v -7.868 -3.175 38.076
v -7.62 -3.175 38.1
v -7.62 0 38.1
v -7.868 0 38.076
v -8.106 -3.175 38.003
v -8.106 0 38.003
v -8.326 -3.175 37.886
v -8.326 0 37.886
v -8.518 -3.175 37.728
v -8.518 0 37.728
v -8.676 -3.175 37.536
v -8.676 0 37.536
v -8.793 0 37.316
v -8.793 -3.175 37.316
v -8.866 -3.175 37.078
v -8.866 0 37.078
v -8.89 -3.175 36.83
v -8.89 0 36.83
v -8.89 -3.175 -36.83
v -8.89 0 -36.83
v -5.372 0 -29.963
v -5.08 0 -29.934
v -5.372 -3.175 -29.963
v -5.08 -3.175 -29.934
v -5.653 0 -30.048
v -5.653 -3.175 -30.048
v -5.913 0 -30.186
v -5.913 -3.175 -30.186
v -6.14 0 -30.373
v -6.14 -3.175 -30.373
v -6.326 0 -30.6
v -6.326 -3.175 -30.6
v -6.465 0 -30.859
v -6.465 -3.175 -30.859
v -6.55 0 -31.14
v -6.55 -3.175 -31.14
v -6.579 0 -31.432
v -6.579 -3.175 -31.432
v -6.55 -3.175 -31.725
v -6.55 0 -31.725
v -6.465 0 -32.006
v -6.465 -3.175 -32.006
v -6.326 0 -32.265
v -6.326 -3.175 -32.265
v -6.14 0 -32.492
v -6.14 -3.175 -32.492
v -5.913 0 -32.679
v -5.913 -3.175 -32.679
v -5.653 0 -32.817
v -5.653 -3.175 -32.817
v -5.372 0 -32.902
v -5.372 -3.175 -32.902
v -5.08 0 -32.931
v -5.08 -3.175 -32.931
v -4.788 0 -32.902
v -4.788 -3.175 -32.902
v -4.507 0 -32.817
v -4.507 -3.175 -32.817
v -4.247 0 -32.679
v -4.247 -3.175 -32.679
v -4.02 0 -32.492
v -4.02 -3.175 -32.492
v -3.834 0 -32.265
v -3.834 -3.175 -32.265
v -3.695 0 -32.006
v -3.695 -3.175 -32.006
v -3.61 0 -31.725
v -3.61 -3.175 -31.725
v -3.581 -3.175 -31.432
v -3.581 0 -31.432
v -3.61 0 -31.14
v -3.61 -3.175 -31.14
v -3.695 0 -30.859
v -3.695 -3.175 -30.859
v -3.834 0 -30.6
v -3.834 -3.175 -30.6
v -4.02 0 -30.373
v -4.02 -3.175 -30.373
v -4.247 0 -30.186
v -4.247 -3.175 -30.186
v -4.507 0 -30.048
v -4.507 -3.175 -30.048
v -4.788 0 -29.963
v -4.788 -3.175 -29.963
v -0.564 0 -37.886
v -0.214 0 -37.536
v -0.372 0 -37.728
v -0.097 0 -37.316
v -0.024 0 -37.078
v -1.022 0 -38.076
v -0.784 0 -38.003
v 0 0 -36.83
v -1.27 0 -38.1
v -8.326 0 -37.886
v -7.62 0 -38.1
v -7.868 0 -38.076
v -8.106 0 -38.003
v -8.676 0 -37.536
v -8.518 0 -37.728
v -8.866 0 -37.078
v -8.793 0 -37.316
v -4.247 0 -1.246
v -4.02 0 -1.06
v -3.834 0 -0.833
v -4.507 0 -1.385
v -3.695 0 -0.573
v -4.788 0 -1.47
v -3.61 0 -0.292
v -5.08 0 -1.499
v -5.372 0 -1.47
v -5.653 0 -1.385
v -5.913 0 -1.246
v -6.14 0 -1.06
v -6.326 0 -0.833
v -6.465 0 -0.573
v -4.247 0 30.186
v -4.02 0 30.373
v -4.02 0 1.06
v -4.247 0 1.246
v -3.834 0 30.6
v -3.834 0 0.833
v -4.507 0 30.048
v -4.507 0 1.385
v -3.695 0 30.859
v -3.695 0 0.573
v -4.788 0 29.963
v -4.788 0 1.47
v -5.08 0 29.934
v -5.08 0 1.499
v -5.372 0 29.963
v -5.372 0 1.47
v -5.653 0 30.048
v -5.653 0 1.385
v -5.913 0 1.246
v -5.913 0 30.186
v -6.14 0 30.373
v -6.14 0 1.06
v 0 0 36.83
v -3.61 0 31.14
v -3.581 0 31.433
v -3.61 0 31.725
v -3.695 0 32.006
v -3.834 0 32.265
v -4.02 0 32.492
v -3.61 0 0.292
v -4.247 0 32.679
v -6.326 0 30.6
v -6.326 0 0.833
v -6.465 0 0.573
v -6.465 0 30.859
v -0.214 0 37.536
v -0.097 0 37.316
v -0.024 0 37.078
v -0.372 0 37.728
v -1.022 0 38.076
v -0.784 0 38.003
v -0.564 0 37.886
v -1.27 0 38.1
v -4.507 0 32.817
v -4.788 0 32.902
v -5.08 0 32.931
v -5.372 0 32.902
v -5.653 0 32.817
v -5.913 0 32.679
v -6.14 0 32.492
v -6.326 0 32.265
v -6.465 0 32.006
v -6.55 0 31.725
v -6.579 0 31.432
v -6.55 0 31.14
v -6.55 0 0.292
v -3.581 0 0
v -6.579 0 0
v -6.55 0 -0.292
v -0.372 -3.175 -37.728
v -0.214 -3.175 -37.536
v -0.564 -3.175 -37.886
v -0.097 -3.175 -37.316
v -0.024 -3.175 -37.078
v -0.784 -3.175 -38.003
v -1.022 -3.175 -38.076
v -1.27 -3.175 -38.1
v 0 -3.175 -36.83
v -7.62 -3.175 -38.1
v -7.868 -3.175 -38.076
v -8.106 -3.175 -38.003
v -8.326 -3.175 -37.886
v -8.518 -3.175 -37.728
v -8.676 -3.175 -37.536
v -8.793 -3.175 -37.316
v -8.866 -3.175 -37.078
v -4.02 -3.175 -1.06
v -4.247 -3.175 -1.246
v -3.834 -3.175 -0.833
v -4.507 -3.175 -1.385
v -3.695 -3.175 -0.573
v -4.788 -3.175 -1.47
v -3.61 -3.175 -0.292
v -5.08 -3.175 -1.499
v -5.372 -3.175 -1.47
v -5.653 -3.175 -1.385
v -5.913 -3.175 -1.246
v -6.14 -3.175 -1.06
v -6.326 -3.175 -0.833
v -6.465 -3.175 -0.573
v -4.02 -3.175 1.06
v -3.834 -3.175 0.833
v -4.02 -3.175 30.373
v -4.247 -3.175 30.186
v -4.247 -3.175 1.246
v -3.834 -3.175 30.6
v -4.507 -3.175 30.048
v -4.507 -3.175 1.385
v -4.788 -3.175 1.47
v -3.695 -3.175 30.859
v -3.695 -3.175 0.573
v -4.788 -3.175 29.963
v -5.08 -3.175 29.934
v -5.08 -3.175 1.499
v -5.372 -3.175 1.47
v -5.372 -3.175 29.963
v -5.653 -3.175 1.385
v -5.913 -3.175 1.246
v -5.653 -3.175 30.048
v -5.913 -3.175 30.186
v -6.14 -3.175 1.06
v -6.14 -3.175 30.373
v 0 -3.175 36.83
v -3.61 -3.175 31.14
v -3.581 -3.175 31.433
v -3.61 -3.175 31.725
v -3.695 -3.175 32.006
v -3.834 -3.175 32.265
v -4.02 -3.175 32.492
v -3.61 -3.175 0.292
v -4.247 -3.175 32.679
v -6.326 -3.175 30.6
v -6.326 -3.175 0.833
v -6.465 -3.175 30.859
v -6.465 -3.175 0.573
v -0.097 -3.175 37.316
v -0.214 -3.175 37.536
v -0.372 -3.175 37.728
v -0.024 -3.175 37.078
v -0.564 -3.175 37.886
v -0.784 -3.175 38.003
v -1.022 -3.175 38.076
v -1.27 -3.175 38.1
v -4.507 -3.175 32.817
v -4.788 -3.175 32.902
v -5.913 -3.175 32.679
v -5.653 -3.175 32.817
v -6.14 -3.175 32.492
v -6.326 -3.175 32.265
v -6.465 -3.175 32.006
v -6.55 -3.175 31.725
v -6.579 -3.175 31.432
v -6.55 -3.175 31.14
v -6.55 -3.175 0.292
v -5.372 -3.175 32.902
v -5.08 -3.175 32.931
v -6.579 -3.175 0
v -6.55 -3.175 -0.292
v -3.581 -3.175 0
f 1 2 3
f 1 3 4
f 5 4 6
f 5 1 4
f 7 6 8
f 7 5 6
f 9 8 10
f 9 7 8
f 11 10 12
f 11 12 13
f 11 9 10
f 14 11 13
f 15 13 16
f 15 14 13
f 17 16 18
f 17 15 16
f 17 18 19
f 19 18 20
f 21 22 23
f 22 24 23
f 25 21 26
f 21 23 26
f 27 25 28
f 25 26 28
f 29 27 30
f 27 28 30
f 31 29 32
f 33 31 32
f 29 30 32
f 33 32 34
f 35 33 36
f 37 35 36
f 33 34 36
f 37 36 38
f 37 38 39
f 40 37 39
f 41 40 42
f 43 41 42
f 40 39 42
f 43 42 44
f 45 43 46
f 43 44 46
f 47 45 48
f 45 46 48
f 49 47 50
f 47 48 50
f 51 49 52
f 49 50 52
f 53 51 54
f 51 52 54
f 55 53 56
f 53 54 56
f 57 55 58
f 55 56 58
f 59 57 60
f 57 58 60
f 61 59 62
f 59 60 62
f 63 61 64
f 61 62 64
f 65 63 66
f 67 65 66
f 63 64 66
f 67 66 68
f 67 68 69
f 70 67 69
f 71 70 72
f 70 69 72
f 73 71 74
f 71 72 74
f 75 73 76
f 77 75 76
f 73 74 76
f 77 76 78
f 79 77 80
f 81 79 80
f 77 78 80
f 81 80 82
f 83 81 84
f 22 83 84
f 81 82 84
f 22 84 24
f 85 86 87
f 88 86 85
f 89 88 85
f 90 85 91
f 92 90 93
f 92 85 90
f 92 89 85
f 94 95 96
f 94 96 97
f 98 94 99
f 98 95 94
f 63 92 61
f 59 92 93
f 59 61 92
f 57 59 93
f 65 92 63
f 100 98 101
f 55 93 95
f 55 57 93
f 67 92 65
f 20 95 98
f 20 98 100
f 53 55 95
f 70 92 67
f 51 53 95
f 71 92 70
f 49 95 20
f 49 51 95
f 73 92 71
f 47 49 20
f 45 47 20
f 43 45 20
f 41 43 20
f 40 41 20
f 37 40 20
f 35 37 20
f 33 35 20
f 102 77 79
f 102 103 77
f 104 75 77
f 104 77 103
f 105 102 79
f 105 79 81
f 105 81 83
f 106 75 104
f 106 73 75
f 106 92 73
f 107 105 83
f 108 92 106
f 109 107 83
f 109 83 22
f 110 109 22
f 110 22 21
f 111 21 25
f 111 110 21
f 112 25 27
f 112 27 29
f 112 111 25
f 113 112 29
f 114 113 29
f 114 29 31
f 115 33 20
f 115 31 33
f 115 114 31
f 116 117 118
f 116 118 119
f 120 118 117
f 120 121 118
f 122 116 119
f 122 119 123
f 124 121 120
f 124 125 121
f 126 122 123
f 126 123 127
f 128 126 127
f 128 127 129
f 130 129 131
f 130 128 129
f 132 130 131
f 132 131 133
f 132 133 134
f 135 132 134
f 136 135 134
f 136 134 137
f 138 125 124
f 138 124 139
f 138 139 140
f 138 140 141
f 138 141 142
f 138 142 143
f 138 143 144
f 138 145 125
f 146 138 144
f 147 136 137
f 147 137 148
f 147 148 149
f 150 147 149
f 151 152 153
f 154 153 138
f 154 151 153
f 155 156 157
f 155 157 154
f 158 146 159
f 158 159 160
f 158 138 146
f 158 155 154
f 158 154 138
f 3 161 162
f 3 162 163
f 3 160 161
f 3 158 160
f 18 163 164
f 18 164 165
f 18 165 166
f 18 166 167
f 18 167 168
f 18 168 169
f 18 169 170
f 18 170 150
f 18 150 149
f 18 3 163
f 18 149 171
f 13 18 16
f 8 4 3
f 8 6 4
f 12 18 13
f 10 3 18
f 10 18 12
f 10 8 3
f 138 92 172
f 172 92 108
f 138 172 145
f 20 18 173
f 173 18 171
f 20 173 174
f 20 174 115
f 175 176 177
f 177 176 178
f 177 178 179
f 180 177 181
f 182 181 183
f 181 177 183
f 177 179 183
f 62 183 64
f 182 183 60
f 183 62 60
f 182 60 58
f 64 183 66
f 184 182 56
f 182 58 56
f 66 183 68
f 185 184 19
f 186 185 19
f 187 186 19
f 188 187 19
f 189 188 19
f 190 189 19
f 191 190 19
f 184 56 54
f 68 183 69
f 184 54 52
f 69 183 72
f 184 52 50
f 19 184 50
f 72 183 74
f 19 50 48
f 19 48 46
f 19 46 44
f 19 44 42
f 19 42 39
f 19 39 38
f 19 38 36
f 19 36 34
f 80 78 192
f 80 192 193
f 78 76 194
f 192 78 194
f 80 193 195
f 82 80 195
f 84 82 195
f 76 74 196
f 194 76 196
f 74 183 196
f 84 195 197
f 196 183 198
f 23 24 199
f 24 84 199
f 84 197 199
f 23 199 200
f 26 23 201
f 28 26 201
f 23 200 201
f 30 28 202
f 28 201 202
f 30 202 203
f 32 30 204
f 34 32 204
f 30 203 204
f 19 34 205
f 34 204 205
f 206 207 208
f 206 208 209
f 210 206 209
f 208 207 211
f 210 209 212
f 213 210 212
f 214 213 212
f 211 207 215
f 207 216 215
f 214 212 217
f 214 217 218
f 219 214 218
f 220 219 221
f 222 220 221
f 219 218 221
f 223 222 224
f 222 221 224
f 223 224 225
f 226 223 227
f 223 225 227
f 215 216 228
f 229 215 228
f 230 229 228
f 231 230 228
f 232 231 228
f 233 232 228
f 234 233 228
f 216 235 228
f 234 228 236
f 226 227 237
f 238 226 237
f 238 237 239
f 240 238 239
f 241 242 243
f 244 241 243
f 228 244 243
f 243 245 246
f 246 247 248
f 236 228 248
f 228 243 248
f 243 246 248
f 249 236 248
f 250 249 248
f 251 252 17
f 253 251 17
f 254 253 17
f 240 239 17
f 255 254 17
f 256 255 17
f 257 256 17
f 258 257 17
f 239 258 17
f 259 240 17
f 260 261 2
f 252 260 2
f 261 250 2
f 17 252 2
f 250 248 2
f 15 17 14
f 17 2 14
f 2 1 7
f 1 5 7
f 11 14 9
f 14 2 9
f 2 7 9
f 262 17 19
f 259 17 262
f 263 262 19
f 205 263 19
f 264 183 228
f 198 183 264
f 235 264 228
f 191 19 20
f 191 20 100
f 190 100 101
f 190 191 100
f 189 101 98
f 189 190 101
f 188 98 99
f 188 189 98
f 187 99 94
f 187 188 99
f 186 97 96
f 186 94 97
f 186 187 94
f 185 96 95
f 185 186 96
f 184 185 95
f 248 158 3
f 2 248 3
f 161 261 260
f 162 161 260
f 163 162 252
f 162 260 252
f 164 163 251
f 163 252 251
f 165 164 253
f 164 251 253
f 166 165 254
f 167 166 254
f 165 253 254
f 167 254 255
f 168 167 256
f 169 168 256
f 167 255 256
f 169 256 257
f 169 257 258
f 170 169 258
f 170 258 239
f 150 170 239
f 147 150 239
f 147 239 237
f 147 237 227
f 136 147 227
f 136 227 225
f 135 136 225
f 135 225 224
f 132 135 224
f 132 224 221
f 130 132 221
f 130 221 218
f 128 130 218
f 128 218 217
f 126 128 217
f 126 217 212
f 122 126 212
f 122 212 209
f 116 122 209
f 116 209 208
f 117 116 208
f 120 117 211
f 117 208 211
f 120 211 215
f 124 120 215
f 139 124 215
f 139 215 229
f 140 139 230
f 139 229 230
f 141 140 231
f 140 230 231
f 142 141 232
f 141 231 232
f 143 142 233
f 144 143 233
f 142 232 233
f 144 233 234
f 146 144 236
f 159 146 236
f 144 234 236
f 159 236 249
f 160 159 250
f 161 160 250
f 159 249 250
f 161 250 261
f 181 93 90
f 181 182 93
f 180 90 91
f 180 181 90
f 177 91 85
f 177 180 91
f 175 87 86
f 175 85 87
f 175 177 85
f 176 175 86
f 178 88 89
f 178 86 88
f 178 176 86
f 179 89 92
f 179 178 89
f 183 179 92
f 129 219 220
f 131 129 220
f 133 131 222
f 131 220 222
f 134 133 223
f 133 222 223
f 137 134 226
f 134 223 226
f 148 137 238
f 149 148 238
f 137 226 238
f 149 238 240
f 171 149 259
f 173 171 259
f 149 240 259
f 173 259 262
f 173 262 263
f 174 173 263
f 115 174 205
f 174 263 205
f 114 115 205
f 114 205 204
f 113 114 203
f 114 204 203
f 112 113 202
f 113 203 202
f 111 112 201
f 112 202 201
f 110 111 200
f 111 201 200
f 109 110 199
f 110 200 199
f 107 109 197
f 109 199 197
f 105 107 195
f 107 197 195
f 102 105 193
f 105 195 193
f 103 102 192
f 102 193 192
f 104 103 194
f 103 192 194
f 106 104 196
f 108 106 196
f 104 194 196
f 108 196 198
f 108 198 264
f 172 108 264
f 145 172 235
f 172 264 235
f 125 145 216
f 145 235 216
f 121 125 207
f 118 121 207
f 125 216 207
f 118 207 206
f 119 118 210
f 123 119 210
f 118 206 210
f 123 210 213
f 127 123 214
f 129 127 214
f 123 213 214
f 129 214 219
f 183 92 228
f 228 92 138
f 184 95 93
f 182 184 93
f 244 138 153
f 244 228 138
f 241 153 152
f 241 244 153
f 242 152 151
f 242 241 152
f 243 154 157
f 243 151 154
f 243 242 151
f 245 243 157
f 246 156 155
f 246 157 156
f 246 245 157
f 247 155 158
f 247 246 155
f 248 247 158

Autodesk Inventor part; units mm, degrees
ref_plane "YZ Plane" through (0, 0, 0) normal (1, 0, 0) x (0, 1, 0)
ref_plane "XZ Plane" through (0, 0, 0) normal (0, 1, 0) x (-1, 0, 0)
ref_plane "XY Plane" through (0, 0, 0) normal (0, 0, 1) x (1, 0, 0)
sketch "Sketch1" plane through (0, 0, 0) normal (0, 1, 0) x (-1, 0, 0)
  line L0 (-1.778, 0) -> (10.668, 0) projected
  line L1 (0, -53.34) -> (0, 53.34) projected
  line L2 (8.89, -38.1) -> (0, -38.1)
  line L3 (0, -38.1) -> (0, 38.1)
  line L4 (0, 38.1) -> (8.89, 38.1)
  line L5 (8.89, 38.1) -> (8.89, -38.1)
  line L6 (8.89, -38.1) -> (0, 38.1) construction
  line L7 (0, -38.1) -> (8.89, 38.1) construction
  point P0 (0, 0)
  point P1 (4.445, 0)
  point P2 (5.08, 31.4325)
  point P3 (5.08, 0)
  point P4 (5.08, -31.4325)
  dimension "d0" = 76.2
  dimension "d1" = 8.89
  dimension "d2" = 5.08
  dimension "d3" = 31.4325
  dimension "d4" = 31.4325
extrude "Extrusion1" add sketch "Sketch1" against normal blind 3.175
fillet "Fillet1" radius 1.27 2 edges at (-8.89, -1.5875, 38.1) (-8.89, -1.5875, -38.1)
fillet "Fillet2" radius 1.27 2 edges at (0, -1.5875, 38.1) (0, -1.5875, -38.1)
hole "Hole1" at (-5.08, 0, 31.4325) at (-5.08, 0, 0) at (-5.08, 0, -31.4325) direction (0, -1, 0) diameter 2.9972 end through all
equation "\"d4\" = d3"
